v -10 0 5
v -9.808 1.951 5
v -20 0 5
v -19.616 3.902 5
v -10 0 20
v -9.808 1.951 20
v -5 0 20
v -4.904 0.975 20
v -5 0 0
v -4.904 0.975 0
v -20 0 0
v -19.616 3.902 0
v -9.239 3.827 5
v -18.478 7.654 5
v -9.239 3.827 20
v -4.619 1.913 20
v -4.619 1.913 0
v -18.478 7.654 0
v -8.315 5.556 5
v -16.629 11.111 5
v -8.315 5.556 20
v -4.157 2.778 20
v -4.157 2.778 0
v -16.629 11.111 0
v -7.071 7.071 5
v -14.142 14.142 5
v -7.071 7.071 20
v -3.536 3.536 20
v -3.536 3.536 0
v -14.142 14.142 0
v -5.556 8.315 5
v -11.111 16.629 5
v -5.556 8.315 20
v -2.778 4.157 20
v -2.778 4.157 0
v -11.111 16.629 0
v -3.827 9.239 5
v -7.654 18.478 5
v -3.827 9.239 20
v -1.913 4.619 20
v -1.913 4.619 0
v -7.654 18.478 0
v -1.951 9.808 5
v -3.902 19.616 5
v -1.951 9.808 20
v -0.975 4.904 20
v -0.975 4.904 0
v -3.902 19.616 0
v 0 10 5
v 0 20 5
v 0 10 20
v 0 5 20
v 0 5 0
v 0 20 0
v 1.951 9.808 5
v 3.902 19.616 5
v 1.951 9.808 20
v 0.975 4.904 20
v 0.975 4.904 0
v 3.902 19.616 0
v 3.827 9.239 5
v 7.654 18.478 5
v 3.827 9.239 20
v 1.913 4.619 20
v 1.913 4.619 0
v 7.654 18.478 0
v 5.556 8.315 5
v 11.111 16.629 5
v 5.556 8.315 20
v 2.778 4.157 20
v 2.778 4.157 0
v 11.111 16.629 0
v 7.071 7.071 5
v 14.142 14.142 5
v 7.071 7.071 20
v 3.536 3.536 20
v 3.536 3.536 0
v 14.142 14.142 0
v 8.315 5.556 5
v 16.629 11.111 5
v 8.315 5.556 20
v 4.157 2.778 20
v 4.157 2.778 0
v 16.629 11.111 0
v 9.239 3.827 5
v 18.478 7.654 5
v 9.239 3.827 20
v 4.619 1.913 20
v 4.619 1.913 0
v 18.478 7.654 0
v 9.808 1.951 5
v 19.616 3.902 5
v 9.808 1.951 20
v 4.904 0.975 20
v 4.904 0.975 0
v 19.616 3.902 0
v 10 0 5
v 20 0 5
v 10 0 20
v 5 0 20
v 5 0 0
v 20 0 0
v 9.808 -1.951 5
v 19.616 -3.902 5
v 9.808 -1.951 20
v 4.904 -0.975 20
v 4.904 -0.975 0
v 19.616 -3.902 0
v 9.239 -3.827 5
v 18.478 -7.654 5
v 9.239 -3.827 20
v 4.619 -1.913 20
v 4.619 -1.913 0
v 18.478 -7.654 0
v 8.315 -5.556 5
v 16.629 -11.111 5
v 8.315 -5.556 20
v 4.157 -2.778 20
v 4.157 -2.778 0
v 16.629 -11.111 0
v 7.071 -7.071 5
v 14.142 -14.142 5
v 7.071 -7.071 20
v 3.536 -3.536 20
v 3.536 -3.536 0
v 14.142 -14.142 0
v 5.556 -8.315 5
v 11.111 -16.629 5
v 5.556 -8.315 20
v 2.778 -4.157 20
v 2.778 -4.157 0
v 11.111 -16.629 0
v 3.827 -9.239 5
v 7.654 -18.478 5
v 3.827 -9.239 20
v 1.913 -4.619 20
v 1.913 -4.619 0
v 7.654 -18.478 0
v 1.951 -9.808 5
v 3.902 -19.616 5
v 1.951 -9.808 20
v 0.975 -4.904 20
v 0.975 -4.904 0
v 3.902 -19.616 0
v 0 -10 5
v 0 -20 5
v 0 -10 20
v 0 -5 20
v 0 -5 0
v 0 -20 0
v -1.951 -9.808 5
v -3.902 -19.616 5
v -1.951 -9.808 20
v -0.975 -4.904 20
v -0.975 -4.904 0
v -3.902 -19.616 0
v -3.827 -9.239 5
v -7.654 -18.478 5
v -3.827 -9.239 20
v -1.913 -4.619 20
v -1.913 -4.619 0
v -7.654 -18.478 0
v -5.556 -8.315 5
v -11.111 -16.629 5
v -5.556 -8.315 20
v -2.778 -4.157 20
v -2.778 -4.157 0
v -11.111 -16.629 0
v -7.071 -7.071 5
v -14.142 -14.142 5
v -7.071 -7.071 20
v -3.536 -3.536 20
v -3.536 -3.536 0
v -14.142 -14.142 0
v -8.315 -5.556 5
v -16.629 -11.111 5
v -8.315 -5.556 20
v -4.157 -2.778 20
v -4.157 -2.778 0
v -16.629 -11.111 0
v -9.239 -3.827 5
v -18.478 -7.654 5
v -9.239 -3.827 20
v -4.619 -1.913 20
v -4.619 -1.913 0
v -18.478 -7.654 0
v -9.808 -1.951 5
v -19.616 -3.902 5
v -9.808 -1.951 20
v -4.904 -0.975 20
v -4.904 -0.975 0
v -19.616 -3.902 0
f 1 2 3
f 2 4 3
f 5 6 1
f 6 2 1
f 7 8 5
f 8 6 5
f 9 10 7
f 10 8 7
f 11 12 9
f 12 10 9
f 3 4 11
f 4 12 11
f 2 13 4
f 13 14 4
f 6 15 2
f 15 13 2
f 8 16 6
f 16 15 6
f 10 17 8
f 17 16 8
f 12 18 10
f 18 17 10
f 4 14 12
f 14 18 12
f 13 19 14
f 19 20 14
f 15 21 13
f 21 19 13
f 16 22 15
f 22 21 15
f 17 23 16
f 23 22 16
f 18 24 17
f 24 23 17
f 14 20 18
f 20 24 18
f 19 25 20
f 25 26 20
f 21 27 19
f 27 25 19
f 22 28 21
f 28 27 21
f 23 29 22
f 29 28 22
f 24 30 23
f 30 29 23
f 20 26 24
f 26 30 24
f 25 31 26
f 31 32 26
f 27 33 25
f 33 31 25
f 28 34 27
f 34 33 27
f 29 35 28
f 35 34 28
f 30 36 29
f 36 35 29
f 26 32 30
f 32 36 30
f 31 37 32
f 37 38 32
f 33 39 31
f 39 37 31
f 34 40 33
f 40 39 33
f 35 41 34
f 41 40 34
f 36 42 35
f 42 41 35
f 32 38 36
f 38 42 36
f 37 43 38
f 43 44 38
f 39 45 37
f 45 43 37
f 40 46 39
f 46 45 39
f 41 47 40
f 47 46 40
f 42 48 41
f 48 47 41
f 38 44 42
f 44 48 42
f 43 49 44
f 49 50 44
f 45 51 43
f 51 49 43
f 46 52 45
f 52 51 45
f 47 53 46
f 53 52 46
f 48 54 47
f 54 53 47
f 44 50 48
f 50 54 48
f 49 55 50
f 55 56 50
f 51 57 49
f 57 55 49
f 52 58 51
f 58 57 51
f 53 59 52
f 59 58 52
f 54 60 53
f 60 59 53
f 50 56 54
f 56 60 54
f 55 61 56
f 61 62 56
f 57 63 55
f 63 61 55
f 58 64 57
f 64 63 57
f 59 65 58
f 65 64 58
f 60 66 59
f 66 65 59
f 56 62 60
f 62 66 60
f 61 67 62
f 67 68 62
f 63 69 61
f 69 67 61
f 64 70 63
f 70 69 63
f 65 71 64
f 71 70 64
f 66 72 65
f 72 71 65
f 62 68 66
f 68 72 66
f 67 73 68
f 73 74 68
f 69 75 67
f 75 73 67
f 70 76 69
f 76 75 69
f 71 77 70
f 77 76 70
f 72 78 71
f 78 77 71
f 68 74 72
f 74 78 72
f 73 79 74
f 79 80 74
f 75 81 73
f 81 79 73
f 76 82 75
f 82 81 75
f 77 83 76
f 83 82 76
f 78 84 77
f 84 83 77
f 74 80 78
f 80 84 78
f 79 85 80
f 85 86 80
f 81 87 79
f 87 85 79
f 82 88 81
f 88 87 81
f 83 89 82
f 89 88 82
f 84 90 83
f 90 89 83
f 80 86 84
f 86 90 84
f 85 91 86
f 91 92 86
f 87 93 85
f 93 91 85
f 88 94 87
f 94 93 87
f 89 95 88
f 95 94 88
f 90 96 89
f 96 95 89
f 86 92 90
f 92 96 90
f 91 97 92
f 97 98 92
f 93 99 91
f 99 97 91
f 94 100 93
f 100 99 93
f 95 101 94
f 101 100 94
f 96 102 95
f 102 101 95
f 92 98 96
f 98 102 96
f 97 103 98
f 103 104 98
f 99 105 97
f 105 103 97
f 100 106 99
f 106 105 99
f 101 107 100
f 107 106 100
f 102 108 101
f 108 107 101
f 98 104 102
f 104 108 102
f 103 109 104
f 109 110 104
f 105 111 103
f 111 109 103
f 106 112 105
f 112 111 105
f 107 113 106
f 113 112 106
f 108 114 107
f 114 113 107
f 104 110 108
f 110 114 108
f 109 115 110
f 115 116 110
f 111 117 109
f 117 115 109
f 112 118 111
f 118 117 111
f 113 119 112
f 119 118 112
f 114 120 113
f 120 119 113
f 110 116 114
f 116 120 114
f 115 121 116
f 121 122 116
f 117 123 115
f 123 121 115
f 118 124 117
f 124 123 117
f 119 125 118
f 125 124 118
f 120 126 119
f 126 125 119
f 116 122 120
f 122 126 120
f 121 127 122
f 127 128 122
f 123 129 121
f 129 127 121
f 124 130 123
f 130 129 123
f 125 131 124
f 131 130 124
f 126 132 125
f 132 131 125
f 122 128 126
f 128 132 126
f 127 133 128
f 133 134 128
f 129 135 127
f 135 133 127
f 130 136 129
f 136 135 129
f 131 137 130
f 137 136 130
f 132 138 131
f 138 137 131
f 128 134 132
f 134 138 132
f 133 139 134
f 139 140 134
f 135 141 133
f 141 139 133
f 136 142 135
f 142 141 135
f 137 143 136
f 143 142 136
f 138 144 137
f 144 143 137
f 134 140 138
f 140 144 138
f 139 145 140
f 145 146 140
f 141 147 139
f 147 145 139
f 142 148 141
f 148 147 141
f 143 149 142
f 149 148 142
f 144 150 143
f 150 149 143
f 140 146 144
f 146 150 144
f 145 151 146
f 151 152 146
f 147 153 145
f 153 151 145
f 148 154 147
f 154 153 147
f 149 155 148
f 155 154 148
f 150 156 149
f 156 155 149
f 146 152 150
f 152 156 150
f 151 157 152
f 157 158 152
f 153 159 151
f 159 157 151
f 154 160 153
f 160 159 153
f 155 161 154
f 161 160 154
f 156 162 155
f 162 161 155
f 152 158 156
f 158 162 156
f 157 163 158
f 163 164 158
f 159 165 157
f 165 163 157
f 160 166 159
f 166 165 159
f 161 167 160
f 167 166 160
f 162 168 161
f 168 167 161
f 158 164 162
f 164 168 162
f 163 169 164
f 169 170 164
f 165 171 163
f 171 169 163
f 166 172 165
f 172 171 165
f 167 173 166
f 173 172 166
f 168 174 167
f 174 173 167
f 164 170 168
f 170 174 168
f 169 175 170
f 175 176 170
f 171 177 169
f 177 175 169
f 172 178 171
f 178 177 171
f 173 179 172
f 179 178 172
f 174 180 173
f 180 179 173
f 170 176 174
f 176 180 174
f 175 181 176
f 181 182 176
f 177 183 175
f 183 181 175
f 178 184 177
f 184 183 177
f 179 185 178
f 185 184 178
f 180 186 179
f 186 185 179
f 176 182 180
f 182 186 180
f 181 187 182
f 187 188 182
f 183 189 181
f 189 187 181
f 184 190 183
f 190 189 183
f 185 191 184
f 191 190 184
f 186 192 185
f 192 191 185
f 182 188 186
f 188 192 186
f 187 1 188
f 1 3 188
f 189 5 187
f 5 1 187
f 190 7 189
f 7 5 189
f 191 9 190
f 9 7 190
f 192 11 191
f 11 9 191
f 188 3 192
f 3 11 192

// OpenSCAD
$fn = 32;

// ----------------------------------------------------------------------
// Revolved part: flanged bushing R20
// ----------------------------------------------------------------------

// --- parameters (mm) ---
bore_r = 5;               // bore radius
flange_r = 20;            // flange radius
flange_h = 5;             // flange thickness
sleeve_r = 10;            // sleeve radius
total_h = 20;             // overall height
revolve_angle = 360;      // revolve sweep, degrees
fit_tol = 0.1;            // declared fit tolerance (prompt contract)
free_tol = 0.3;           // declared free tolerance (prompt contract)

bore_d = 2 * bore_r;
flange_d = 2 * flange_r;
sleeve_d = 2 * sleeve_r;

profile = [[5, 0], [20, 0], [20, 5], [10, 5], [10, 20], [5, 20]];  // primary outline, 6 points, counter clockwise

// --- the one profile operation ---
rotate_extrude(angle = revolve_angle) polygon(points = profile);
